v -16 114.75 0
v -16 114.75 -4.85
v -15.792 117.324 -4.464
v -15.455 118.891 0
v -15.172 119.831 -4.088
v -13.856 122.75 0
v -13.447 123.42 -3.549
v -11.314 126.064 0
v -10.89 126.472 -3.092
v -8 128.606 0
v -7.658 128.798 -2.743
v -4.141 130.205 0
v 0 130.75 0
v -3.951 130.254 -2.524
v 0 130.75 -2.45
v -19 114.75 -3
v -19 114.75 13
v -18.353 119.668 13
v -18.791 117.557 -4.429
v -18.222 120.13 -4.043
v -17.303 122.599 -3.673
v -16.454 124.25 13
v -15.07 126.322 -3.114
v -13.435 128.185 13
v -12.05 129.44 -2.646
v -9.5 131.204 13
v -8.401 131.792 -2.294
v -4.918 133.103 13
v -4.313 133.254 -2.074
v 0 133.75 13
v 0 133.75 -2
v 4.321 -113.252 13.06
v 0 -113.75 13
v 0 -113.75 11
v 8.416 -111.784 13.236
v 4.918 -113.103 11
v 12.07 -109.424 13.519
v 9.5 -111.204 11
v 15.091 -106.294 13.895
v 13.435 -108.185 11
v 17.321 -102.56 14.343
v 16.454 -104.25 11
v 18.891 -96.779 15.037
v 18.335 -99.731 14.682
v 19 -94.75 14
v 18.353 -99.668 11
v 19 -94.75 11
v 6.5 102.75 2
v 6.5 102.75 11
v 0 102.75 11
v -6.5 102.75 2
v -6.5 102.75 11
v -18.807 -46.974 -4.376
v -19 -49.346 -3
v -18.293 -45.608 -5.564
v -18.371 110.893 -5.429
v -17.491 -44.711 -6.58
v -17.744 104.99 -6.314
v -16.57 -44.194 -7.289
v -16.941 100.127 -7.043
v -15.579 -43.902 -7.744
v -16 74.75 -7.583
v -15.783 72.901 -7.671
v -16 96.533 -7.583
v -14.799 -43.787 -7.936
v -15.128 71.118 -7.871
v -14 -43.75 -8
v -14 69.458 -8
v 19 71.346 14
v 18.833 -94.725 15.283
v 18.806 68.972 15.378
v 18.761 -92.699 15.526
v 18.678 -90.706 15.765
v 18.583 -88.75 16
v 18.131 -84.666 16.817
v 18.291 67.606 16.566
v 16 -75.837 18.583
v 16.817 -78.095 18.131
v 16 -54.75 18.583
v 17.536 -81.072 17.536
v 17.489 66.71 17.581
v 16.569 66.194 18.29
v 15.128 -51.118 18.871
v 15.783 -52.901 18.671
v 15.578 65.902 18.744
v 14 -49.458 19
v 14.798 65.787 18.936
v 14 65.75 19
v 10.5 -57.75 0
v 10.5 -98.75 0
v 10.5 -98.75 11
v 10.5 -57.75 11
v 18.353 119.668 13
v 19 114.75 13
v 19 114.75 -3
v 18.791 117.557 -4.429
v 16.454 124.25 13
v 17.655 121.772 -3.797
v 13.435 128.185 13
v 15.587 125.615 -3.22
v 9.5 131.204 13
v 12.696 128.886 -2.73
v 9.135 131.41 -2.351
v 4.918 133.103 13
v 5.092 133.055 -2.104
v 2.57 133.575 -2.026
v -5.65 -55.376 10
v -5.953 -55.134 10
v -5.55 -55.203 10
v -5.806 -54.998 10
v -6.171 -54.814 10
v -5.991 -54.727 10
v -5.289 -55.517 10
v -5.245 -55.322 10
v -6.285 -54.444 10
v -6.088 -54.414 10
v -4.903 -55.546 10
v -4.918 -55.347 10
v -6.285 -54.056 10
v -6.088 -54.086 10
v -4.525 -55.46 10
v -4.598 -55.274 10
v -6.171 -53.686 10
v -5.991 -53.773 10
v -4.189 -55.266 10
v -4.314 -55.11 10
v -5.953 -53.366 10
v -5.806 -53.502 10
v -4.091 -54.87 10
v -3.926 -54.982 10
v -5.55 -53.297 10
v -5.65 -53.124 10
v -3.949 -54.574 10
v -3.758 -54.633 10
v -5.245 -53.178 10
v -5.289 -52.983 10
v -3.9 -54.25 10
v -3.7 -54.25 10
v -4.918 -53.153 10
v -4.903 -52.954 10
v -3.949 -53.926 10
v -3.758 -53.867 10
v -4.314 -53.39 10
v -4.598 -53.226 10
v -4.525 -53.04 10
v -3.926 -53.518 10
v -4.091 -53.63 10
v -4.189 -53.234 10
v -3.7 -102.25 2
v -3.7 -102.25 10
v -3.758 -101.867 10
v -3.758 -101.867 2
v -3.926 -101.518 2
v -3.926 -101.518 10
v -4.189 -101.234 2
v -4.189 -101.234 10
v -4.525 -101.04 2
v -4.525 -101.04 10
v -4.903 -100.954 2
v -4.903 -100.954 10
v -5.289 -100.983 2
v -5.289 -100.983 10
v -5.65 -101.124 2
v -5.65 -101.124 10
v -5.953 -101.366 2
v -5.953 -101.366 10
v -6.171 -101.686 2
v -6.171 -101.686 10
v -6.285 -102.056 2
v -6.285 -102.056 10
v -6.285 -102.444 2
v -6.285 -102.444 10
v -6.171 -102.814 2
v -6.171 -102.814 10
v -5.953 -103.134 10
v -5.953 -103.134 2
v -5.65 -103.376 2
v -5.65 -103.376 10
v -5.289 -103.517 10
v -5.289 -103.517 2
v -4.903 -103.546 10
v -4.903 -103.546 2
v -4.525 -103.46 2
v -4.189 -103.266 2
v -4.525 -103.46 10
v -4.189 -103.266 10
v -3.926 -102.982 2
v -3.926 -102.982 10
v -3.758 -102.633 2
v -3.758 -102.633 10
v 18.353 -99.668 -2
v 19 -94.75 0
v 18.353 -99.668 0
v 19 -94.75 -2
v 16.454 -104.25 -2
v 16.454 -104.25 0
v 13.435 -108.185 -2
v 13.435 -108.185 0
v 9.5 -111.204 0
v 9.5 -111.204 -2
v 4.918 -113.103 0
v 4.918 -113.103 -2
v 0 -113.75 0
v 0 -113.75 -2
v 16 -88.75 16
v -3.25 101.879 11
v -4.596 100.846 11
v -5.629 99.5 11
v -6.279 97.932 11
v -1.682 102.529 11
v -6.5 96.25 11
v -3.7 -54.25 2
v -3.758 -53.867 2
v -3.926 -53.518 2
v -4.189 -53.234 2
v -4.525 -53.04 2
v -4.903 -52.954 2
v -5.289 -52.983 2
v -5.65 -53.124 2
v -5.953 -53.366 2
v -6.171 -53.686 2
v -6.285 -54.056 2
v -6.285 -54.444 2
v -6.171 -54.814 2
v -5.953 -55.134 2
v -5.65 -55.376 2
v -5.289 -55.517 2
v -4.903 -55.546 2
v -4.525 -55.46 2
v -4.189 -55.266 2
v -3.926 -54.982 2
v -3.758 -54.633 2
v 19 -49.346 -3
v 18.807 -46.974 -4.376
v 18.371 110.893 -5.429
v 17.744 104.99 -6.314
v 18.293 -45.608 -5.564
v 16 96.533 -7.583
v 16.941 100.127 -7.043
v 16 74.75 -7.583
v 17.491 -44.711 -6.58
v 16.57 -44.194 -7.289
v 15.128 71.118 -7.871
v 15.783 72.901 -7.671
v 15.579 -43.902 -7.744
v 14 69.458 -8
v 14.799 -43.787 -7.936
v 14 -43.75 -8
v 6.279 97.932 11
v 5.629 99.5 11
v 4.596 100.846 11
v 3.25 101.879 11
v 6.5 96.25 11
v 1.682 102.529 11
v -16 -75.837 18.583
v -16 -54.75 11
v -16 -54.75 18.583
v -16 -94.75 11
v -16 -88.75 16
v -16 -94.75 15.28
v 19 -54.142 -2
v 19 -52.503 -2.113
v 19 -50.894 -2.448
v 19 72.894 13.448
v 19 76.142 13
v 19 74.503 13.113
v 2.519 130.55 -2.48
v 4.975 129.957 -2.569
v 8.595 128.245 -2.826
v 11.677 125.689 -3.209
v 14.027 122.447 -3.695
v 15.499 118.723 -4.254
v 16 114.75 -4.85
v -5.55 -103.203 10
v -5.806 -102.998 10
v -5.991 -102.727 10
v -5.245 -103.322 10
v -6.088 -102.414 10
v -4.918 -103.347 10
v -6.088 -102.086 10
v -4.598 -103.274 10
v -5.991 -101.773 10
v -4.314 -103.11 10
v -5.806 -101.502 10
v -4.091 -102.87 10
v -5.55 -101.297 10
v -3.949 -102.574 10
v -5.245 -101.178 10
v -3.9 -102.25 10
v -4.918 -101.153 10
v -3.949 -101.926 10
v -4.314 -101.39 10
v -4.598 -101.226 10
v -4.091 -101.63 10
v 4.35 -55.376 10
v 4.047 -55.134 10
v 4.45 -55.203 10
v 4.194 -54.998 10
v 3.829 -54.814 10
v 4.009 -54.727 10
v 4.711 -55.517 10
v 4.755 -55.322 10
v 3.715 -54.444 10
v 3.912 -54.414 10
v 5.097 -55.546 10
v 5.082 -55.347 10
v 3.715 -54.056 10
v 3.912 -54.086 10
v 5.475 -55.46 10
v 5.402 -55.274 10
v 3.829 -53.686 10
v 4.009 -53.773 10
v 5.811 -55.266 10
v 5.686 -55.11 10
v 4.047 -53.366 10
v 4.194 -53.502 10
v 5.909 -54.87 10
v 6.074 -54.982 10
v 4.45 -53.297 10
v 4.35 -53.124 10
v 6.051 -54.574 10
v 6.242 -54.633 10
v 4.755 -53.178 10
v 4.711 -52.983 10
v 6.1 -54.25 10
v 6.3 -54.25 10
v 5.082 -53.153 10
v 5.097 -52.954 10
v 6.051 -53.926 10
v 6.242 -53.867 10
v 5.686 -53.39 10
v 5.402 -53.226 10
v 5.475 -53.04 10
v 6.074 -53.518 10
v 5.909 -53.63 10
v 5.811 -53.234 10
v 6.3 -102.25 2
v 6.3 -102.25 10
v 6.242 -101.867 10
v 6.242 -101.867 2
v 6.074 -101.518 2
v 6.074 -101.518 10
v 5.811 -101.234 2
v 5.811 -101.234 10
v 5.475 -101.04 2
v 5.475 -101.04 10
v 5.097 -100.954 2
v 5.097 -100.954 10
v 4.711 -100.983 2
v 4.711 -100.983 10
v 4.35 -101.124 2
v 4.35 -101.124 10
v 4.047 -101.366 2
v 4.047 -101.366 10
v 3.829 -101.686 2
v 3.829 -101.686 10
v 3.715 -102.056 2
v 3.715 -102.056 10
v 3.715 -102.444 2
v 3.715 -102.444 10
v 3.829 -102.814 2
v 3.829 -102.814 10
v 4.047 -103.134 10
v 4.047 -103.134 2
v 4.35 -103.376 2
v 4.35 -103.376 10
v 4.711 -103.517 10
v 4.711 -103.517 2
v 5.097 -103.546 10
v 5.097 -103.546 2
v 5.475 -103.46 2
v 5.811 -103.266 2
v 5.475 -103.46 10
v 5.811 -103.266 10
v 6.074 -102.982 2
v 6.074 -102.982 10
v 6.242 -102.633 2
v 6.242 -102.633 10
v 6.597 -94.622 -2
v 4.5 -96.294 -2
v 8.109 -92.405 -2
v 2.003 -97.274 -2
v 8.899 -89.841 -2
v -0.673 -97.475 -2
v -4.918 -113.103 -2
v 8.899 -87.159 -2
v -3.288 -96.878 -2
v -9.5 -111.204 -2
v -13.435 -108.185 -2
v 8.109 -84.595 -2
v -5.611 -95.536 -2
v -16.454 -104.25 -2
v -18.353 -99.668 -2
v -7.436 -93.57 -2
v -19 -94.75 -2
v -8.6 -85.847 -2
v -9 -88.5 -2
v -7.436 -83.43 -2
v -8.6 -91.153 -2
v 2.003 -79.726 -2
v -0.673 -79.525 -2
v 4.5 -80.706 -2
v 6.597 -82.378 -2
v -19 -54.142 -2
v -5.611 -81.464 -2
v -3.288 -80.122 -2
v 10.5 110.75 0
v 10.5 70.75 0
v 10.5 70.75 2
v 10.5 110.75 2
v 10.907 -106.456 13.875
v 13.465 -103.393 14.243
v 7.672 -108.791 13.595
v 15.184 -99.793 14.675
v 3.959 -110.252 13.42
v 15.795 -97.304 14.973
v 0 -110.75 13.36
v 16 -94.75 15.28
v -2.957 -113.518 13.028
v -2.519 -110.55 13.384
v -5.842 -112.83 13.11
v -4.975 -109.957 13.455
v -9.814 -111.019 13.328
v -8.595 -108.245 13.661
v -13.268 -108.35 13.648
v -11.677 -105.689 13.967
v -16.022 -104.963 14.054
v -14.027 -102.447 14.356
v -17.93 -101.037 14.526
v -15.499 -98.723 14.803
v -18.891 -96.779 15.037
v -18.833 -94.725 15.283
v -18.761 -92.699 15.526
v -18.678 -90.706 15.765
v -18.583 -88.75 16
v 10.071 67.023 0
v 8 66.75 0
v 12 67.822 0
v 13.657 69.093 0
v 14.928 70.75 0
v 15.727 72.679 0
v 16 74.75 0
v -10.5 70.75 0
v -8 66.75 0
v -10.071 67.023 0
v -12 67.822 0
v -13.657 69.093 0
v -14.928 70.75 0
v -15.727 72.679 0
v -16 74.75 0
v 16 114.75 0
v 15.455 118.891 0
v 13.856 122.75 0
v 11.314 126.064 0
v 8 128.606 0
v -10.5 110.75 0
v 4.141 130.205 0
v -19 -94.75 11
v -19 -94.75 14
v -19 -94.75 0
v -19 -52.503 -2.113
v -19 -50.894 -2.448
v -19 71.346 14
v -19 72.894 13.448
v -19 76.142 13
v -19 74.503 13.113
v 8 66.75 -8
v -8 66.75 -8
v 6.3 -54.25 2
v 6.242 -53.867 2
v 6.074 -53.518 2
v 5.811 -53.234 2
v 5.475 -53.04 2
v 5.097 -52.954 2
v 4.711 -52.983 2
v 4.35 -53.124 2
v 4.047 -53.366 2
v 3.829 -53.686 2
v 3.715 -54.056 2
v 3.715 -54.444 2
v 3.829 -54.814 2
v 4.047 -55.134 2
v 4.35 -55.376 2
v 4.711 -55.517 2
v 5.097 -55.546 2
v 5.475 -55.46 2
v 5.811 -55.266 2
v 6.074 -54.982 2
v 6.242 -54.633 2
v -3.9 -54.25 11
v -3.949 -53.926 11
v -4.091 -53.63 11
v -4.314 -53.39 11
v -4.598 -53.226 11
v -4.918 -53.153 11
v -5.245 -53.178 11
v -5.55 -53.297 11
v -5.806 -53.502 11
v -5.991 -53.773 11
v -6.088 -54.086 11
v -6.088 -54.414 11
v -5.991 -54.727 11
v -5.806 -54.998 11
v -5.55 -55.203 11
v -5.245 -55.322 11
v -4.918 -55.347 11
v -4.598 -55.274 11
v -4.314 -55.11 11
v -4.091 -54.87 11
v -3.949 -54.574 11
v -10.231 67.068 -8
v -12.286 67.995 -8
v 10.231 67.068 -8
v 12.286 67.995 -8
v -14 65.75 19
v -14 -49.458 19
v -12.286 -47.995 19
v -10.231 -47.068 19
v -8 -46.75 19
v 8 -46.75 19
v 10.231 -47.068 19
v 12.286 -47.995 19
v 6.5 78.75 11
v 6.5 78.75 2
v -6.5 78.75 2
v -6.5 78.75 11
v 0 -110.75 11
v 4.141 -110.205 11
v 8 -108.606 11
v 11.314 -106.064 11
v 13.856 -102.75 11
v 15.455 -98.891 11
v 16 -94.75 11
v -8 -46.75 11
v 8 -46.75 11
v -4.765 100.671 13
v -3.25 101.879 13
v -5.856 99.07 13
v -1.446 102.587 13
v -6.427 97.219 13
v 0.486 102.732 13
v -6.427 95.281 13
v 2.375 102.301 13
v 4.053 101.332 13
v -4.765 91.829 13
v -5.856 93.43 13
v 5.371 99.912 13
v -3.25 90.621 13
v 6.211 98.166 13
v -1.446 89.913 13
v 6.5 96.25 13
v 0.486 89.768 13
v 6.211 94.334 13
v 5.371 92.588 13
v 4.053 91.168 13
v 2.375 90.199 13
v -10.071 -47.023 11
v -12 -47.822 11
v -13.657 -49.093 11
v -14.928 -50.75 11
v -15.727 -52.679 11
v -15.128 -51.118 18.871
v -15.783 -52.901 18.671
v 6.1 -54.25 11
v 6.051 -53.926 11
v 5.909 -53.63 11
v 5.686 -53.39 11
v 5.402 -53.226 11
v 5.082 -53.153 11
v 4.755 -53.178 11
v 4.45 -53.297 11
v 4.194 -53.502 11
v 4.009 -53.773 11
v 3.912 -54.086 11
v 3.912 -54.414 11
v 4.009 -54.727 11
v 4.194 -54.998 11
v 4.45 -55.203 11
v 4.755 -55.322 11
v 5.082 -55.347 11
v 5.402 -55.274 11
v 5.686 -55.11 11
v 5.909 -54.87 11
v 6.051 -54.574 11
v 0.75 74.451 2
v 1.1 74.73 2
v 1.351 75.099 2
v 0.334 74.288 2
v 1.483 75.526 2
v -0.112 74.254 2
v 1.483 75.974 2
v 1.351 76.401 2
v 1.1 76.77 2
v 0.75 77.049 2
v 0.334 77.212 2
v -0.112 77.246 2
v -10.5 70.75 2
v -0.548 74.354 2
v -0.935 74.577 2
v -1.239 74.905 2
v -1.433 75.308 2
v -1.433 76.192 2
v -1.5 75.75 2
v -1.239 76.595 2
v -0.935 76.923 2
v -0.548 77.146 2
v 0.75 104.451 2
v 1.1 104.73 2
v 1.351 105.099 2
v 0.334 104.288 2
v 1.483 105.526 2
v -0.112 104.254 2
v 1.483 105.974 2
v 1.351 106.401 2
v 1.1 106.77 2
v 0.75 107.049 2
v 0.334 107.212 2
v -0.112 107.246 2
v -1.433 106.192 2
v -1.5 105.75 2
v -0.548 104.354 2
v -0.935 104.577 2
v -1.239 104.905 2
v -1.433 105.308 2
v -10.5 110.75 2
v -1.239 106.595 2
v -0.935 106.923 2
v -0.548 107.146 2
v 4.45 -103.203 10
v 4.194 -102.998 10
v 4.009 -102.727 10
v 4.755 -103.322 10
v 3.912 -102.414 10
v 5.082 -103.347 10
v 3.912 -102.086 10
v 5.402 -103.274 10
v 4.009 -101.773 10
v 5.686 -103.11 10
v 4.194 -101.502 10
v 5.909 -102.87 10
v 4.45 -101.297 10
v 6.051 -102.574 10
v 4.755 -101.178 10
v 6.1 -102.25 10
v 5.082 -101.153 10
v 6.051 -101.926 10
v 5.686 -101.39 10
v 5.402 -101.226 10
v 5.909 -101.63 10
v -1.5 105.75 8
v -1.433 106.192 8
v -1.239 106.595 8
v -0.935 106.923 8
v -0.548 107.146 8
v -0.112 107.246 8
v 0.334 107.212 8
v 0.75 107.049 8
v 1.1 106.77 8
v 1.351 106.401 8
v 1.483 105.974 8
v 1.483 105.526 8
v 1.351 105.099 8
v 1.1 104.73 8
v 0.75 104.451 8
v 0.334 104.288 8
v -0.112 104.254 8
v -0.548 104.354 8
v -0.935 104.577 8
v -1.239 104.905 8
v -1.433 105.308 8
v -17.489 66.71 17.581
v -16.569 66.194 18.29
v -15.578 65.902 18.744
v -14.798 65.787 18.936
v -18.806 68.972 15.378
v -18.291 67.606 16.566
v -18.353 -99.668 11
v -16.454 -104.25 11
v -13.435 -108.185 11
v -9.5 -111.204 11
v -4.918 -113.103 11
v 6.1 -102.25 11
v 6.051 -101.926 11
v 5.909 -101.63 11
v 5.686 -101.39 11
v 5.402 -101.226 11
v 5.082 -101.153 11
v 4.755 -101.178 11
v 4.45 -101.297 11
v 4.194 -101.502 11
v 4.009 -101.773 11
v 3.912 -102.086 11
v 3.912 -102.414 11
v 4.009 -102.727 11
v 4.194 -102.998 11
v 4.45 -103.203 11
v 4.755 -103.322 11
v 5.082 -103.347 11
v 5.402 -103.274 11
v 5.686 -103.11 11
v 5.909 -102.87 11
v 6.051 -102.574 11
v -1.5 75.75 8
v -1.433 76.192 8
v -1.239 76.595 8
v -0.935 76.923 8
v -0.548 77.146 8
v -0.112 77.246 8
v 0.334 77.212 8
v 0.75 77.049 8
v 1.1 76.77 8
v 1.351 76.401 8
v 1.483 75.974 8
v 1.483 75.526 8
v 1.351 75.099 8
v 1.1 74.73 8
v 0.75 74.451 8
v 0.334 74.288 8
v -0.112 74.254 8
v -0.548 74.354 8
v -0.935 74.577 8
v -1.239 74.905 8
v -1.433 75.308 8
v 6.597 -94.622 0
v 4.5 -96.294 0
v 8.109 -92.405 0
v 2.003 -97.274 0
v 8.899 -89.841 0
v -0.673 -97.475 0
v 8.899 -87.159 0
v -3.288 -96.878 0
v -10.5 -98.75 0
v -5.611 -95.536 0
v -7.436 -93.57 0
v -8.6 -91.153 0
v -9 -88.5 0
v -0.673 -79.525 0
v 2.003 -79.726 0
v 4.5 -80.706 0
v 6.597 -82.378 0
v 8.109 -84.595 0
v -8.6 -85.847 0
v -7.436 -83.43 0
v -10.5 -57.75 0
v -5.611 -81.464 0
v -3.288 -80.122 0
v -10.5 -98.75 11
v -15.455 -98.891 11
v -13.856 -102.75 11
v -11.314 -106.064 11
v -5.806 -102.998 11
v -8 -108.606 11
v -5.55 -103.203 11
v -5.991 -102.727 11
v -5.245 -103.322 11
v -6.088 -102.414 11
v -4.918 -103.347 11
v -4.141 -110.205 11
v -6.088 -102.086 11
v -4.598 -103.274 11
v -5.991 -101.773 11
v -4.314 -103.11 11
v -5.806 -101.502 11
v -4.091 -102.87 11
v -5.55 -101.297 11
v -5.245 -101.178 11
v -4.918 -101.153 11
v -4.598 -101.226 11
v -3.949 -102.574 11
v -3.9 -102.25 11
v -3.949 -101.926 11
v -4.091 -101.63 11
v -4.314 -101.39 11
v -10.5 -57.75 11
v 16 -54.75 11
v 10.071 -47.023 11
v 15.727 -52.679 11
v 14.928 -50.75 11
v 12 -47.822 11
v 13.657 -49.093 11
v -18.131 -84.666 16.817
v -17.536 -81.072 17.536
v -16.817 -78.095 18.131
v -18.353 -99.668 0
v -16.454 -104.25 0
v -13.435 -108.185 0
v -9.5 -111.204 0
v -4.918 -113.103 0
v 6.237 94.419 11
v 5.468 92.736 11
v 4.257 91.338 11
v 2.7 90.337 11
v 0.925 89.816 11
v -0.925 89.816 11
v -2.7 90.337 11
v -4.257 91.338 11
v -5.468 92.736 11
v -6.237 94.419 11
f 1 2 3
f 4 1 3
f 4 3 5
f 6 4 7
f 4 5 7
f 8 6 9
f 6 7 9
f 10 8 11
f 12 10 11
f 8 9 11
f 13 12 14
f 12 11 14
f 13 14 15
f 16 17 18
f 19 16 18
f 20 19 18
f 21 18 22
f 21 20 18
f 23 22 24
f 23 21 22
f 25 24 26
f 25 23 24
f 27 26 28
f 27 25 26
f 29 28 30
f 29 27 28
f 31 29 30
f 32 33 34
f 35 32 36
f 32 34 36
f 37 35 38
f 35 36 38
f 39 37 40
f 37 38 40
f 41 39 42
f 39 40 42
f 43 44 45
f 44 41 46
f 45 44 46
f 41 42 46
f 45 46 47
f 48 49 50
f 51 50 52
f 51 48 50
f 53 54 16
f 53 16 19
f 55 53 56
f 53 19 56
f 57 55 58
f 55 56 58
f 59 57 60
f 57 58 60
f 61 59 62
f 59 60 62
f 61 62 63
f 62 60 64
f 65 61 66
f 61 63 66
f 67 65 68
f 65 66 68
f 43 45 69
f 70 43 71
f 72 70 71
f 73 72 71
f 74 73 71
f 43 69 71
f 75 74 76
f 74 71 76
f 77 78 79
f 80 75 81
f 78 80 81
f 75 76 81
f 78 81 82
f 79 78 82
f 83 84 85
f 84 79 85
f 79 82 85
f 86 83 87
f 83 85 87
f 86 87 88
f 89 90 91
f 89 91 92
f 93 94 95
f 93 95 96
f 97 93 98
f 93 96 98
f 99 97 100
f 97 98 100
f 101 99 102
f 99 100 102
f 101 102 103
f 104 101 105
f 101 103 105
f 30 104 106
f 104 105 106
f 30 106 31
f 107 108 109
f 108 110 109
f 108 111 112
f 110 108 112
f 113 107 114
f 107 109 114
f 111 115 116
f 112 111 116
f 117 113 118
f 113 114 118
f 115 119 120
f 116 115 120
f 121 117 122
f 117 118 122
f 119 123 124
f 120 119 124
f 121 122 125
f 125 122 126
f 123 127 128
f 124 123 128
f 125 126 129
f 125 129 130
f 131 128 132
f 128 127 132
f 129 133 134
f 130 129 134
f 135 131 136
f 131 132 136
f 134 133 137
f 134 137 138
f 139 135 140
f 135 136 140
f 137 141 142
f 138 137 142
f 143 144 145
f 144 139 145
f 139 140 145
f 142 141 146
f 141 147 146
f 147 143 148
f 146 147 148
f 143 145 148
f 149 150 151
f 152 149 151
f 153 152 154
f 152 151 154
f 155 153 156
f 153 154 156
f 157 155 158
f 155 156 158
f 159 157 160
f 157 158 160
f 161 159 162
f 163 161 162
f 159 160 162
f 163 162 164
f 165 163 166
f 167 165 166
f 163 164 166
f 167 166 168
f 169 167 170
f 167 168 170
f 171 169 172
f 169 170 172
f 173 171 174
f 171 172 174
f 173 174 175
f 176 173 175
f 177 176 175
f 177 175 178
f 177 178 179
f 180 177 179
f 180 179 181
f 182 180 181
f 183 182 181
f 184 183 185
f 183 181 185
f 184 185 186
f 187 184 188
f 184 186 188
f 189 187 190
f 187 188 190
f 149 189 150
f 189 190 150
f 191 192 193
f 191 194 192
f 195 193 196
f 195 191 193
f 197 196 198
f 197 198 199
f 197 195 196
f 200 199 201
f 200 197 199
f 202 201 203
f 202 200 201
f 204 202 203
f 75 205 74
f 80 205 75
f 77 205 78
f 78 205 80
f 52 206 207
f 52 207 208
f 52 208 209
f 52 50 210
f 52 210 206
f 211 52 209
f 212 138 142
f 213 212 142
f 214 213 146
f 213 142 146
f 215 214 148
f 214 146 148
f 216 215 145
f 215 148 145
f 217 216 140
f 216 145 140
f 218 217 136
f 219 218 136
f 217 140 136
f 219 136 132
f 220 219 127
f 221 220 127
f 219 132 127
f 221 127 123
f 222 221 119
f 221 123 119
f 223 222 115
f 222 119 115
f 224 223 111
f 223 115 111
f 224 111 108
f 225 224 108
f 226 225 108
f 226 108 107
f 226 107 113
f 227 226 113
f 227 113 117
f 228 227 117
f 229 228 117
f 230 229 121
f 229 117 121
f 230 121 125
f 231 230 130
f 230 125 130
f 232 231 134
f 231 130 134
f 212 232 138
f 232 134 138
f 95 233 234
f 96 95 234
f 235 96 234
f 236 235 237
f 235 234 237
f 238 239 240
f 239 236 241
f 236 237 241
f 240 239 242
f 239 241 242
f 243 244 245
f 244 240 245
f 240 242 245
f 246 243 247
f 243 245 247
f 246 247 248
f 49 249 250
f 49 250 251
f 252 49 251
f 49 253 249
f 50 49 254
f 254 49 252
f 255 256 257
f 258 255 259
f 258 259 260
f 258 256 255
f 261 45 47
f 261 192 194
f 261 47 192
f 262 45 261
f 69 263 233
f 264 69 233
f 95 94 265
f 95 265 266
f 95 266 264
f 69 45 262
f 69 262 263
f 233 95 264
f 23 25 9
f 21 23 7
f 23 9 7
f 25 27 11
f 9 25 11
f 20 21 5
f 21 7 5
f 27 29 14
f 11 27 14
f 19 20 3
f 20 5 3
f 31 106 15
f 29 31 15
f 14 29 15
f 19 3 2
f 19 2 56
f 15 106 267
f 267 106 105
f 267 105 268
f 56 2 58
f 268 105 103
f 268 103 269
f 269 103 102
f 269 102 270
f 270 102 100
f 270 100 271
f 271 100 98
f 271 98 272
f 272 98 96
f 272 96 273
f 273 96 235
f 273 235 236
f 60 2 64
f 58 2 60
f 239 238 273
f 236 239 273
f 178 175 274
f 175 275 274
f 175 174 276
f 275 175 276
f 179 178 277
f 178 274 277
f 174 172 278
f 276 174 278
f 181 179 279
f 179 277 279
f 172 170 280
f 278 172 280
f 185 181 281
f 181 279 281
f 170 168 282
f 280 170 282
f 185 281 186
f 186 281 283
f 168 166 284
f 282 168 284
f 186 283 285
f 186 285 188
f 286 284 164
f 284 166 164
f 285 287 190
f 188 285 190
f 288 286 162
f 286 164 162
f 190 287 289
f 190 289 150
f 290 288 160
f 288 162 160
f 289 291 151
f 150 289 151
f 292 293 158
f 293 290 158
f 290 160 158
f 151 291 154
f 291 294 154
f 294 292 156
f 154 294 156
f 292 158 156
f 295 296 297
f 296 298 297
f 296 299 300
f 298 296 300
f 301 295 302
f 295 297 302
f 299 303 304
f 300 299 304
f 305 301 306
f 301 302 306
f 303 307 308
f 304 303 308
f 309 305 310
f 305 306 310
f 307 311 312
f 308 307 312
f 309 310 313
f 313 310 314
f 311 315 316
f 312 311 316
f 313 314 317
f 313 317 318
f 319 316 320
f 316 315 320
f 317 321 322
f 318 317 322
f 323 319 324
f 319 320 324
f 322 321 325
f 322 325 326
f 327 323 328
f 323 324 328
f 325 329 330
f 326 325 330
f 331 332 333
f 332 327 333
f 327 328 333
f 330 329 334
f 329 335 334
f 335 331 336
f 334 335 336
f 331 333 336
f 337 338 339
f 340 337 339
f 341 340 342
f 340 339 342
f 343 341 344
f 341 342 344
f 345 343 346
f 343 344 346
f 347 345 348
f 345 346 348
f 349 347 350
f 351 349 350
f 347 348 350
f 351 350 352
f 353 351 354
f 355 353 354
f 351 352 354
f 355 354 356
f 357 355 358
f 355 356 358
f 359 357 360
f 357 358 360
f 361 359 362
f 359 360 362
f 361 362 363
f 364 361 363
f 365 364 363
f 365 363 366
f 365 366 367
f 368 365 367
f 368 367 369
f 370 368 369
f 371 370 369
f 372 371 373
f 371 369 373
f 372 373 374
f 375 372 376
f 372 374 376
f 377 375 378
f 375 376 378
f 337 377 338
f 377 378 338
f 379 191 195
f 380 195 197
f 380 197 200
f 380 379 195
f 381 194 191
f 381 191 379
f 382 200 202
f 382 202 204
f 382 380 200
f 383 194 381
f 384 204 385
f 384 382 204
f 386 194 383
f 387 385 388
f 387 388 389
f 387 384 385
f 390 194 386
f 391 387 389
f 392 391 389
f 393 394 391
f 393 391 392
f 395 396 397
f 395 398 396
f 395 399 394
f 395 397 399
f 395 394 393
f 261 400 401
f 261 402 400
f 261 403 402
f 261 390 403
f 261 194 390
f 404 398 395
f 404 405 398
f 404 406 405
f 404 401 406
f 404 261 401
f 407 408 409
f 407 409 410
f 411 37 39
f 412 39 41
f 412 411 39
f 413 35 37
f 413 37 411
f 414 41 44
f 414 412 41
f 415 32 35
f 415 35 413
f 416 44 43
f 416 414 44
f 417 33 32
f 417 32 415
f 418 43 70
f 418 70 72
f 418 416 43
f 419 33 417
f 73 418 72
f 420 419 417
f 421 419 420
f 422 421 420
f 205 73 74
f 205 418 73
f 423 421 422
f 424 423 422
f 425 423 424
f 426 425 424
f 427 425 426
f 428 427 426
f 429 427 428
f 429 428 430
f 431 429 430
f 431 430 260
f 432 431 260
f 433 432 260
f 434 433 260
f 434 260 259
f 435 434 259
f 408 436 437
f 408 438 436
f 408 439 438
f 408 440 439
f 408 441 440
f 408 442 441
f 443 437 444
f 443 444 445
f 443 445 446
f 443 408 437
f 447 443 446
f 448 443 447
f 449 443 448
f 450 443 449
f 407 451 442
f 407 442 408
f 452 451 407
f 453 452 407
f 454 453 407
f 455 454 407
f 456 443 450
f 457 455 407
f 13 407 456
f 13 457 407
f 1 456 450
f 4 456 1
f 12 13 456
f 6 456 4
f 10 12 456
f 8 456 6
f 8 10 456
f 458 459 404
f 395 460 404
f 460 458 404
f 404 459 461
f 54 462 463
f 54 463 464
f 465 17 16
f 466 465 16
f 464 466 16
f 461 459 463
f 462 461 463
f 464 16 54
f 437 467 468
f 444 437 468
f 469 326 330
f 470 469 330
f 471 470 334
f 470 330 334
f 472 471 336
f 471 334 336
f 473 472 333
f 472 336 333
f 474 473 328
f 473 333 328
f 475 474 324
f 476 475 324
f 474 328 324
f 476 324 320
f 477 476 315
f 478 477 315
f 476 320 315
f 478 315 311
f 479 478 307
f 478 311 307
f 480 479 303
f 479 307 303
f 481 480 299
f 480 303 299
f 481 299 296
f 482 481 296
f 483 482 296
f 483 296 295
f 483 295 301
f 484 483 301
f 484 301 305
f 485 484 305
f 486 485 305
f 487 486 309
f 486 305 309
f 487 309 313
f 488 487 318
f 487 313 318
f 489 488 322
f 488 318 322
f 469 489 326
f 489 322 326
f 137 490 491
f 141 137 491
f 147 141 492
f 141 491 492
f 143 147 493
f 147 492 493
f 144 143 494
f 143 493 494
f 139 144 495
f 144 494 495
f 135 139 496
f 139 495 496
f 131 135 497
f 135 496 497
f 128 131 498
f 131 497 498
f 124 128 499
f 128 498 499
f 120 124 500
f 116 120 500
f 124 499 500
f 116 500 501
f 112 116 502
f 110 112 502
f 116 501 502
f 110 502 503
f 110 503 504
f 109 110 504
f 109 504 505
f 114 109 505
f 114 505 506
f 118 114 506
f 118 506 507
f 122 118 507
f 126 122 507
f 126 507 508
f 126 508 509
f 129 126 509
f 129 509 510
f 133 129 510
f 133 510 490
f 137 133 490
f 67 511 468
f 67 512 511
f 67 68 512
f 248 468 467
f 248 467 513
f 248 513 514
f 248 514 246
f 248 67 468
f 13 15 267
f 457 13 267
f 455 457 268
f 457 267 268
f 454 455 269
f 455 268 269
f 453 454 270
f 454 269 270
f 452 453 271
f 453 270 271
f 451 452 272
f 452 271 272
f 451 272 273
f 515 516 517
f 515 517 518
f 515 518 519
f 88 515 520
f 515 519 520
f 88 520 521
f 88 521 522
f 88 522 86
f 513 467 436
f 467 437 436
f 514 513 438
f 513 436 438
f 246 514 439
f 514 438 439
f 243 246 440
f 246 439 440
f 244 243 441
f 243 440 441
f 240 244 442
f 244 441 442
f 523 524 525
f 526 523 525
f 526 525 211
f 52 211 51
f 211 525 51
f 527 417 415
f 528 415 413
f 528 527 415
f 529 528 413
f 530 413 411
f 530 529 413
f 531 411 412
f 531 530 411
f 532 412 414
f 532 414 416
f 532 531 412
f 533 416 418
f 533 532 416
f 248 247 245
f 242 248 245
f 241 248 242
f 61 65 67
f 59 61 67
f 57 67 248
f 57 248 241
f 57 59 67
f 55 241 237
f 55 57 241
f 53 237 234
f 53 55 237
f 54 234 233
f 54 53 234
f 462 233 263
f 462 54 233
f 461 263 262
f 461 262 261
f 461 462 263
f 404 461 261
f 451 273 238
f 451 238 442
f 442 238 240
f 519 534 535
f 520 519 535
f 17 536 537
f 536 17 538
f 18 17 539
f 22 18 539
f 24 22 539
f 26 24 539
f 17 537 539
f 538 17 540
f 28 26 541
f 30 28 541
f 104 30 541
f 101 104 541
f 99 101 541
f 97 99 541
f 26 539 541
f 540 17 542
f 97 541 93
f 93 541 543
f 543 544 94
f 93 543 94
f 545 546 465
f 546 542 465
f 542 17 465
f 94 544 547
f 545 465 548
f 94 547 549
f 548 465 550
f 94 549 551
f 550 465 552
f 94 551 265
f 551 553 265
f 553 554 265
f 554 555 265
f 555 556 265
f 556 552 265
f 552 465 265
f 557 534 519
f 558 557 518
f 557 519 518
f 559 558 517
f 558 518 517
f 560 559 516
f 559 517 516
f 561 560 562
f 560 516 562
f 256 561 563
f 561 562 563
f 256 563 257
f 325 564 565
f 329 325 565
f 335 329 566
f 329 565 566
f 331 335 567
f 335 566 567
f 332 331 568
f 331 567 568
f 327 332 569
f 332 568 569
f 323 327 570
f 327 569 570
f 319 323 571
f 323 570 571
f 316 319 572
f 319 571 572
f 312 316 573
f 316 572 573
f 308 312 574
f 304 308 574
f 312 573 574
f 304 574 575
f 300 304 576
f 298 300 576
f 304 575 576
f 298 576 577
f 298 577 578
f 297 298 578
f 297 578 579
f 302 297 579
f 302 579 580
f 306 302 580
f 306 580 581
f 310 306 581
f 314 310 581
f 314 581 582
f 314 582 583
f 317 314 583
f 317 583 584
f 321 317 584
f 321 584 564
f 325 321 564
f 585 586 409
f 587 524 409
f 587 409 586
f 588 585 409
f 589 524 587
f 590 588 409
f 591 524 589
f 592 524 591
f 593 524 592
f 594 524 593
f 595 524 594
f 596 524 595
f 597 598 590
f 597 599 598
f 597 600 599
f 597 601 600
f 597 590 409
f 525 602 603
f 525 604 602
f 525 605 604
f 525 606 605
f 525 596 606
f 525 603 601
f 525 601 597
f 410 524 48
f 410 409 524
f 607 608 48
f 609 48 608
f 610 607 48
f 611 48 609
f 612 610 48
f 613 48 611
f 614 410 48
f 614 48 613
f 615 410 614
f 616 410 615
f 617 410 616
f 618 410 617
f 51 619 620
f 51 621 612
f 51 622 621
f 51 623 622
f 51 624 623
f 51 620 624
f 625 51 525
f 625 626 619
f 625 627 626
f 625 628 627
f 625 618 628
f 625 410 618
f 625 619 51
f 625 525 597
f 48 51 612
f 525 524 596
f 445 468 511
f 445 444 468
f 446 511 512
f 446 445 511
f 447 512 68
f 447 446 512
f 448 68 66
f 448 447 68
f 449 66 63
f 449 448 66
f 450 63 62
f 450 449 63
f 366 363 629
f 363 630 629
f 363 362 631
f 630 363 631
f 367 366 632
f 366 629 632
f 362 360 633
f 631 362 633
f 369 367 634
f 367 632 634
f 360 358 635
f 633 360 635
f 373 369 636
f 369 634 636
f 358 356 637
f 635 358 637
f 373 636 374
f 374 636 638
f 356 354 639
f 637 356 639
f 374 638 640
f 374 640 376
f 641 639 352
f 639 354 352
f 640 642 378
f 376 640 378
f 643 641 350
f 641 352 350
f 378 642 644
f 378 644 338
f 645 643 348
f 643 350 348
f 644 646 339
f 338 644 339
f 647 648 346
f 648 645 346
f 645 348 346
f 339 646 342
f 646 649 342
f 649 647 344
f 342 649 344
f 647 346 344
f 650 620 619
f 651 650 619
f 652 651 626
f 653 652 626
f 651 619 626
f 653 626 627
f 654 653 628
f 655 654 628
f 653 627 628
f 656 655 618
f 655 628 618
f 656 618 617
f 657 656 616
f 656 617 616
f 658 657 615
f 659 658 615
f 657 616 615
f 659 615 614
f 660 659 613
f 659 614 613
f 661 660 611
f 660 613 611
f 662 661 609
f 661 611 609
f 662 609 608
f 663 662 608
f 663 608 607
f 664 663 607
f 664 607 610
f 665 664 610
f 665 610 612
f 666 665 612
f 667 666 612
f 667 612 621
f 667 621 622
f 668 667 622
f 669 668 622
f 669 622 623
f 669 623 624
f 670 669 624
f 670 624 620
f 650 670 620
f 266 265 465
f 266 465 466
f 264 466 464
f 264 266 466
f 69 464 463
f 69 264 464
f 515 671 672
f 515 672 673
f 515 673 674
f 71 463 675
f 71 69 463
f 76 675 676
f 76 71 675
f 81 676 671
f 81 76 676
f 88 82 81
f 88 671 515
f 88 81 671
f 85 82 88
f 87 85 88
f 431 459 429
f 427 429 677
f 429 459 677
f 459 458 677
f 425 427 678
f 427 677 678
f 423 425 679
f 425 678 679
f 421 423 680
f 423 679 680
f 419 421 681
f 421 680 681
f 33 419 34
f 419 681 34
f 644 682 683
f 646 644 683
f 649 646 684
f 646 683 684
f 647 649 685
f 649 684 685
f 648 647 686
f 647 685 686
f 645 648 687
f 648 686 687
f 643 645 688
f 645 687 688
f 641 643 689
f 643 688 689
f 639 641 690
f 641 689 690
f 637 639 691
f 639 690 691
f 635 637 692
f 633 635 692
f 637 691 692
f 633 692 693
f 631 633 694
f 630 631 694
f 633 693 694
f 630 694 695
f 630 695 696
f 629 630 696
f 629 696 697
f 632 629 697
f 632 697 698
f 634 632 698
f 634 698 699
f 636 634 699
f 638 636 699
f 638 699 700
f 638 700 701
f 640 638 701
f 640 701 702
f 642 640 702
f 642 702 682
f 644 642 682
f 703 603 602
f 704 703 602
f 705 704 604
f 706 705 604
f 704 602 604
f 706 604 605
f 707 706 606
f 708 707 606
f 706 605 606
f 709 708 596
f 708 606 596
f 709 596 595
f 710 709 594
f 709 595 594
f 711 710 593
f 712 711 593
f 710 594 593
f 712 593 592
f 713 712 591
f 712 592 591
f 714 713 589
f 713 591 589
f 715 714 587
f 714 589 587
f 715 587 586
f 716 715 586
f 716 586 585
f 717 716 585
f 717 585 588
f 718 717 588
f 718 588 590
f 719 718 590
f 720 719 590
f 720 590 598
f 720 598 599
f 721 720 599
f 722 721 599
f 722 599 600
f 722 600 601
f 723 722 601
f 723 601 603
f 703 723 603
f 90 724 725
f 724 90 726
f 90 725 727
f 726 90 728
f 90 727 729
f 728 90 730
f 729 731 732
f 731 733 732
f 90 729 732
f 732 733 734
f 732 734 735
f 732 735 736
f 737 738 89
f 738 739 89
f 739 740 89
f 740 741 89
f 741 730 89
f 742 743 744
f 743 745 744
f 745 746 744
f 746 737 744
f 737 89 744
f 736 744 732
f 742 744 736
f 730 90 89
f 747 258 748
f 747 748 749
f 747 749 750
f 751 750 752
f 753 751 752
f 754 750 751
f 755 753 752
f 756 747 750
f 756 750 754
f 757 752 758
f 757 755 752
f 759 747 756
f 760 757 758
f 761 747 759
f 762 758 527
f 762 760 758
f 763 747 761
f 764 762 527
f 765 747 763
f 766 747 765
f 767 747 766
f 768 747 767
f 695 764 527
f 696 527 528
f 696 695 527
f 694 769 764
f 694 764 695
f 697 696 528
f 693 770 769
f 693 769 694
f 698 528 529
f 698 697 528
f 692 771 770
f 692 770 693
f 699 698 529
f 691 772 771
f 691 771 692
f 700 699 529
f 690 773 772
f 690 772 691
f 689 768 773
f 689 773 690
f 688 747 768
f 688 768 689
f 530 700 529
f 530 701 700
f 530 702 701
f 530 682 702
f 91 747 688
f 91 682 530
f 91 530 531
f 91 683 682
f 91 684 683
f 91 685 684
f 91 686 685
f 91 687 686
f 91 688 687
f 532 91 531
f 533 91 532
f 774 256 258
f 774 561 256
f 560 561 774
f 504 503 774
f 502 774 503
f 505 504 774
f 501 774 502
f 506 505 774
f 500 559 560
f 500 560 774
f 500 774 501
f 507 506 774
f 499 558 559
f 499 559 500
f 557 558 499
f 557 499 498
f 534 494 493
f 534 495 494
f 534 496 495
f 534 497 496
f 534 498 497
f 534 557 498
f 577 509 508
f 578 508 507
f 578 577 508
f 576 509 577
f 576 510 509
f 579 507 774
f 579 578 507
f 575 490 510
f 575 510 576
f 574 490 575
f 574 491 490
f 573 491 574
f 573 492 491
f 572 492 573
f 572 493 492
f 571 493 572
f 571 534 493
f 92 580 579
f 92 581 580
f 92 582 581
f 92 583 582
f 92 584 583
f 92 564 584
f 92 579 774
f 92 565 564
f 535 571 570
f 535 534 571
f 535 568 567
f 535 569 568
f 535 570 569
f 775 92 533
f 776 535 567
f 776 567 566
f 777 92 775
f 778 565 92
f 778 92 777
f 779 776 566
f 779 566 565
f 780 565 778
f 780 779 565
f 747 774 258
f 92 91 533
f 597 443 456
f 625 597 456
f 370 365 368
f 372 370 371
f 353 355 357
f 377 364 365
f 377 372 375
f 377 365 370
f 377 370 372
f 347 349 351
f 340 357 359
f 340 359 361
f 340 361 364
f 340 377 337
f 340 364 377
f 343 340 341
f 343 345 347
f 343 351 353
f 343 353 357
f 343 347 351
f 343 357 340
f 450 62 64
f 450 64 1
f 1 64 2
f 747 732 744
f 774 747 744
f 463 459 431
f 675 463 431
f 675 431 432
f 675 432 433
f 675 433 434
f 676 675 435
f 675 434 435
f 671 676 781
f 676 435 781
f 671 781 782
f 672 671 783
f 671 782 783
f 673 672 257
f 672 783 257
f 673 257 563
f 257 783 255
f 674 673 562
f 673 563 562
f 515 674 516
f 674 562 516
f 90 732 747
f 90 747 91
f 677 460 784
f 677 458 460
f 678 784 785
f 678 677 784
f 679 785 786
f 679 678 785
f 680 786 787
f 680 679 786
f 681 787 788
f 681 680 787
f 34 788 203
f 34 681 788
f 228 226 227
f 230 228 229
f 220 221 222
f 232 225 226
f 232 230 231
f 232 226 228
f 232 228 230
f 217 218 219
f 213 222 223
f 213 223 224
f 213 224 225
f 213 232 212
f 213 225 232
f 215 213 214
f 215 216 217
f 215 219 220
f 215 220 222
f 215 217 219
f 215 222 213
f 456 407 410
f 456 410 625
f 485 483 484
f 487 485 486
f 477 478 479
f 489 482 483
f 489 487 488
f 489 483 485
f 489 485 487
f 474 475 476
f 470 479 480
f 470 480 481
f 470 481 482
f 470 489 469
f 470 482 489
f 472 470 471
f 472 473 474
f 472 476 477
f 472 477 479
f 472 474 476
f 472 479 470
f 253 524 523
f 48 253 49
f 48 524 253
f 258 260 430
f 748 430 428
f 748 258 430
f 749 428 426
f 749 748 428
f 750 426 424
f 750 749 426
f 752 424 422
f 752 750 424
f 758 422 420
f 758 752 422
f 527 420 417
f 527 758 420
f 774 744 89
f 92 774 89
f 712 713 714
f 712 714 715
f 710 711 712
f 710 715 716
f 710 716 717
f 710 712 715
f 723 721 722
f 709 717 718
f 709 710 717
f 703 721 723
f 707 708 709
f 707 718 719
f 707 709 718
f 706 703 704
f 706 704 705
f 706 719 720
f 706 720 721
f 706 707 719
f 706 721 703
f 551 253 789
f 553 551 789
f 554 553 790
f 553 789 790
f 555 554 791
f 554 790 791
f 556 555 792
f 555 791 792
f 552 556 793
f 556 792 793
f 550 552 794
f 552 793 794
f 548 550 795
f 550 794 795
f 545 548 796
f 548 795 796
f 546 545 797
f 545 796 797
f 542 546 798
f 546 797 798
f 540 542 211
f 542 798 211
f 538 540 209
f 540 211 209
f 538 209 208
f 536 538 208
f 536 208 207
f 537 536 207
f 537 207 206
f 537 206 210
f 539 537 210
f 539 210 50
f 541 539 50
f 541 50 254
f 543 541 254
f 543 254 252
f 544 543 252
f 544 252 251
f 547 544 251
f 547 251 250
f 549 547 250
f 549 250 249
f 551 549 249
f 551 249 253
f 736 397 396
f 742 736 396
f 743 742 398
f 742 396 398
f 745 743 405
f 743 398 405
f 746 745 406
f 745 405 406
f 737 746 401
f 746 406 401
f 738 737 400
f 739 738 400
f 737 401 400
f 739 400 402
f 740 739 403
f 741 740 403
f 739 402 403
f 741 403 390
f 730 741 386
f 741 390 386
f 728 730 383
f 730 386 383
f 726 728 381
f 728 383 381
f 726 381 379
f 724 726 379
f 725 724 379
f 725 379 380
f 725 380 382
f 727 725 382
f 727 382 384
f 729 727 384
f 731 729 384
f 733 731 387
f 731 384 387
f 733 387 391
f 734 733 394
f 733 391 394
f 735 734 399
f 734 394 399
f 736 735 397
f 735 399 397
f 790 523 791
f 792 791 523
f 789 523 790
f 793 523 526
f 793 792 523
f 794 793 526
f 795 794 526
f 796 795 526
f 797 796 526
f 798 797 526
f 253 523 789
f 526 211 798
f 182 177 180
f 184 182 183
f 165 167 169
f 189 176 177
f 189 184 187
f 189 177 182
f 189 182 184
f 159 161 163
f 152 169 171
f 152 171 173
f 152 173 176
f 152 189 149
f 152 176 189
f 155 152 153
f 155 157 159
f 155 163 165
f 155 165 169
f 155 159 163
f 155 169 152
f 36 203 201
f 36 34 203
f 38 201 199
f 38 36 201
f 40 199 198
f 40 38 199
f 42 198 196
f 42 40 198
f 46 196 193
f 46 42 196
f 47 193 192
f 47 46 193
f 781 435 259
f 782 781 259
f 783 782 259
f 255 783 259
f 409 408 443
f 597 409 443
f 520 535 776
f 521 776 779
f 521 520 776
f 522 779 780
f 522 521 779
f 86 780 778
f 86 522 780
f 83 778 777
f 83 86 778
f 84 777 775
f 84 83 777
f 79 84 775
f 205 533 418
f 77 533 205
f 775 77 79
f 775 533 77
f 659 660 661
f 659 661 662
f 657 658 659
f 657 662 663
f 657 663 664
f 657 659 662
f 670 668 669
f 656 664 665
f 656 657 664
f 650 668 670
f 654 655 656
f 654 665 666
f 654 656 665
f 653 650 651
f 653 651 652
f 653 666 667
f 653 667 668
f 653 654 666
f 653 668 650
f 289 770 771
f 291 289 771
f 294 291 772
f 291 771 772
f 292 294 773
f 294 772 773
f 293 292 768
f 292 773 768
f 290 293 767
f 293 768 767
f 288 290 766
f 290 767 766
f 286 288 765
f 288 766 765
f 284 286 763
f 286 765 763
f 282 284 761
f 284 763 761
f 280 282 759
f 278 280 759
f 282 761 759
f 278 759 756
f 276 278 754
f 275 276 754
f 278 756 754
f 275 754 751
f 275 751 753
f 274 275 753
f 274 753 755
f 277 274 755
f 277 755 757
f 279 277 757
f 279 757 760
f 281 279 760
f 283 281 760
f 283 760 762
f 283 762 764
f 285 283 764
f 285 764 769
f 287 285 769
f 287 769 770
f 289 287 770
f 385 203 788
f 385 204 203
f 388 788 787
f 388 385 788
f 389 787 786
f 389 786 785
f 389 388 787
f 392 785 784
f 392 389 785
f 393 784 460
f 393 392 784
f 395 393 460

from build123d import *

# Parameters (mm, degrees)
SKETCH1_W               = 38
SKETCH1_H               = 227.5
SKETCH1_W_2             = 21
SKETCH1_H_2             = 41
BOSS_EXTRUDE1_DEPTH     = 11
SKETCH3_R               = 1.3
CUT_EXTRUDE1_DEPTH      = 8
FILLET3_R               = 19
BOSS_EXTRUDE2_DEPTH     = 8
CUT_EXTRUDE2_DEPTH      = 117.880547997
CUT_EXTRUDE2_DEPTH_BACK = 117.880547997
SKETCH7_W               = 32
SKETCH7_H               = 157.5
BOSS_EXTRUDE4_DEPTH     = 8
SKETCH8_W               = 38
SKETCH8_H               = 157.5
BOSS_EXTRUDE5_DEPTH     = 8
BOSS_EXTRUDE10_START    = 2
SKETCH27_R              = 9
BOSS_EXTRUDE10_DEPTH    = 2
SKETCH28_W              = 38
SKETCH28_H              = 27
BOSS_EXTRUDE11_DEPTH    = 20
FILLET4_R               = 19
CUT_EXTRUDE14_DEPTH     = 8
SKETCH30_W              = 13
SKETCH30_H              = 24
CUT_EXTRUDE15_DEPTH     = 11
CUT_EXTRUDE16_REACH     = 138.422
SKETCH31_R              = 6.5
CUT_EXTRUDE17_START     = 65.75
CUT_EXTRUDE17_OUTLINE_W = 38
CUT_EXTRUDE17_OUTLINE_H = 6
CUT_EXTRUDE17_DEPTH     = 68
FILLET5_R               = 12
CUT_EXTRUDE18_DEPTH     = 141.335535414
FILLET7_R               = 5
SKETCH34_R              = 1.5
CUT_EXTRUDE19_DEPTH     = 8
SKETCH35_R              = 1.1
CUT_EXTRUDE20_DEPTH     = 8
FILLET8_R               = 8
SKETCH36_W              = 21
SKETCH36_H              = 40
CUT_EXTRUDE21_DEPTH     = 2


# Read off the part's stored shape, not the designer's step: Cut-Extrude17
# Some blends are built 0.0001 mm under size
with BuildPart() as part:
    # Sketch1 → Boss-Extrude1 (new body)
    with BuildSketch(Plane.XY):
        Rectangle(SKETCH1_W, SKETCH1_H)
        with Locations((0, -78.25)):
            Rectangle(SKETCH1_W_2, SKETCH1_H_2, mode=Mode.SUBTRACT)
    extrude(amount=BOSS_EXTRUDE1_DEPTH)

    # Sketch3 → Cut-Extrude1 (cut)
    with BuildSketch(Plane.XY.offset(10)):
        with Locations((-5, -54.25)):
            Circle(SKETCH3_R)
        with Locations((5, -54.25)):
            Circle(SKETCH3_R)
        with Locations((5, -102.25)):
            Circle(SKETCH3_R)
        with Locations((-5, -102.25)):
            Circle(SKETCH3_R)
    extrude(amount=-CUT_EXTRUDE1_DEPTH, mode=Mode.SUBTRACT)

    # Fillet3
    fillet3_edges = [part.edges().sort_by_distance(p)[0] for p in [
        (19, -113.75, 5.5),
        (-19, -113.75, 5.5),
    ]]
    fillet(fillet3_edges, radius=FILLET3_R - 0.0001)  # a hair under: the kernel refuses the full size

    # Sketch4 → Boss-Extrude2 (add)
    with BuildSketch(Plane.XY.offset(11)):
        with BuildLine():
            Line((19, -94.75), (19, 113.75))
            Line((19, 113.75), (-19, 113.75))
            Line((-19, 113.75), (-19, -94.75))
            ThreePointArc((-19, -94.75), (-13.435028843, -108.185028843), (0, -113.75))
            ThreePointArc((0, -113.75), (13.435028843, -108.185028843), (19, -94.75))
        make_face()
        with BuildLine():
            Line((16, -94.75), (16, 110.75))
            Line((16, 110.75), (-16, 110.75))
            Line((-16, 110.75), (-16, -94.75))
            ThreePointArc((-16, -94.75), (-11.313708499, -106.063708499), (0, -110.75))
            ThreePointArc((0, -110.75), (11.313708499, -106.063708499), (16, -94.75))
        make_face(mode=Mode.SUBTRACT)
    extrude(amount=BOSS_EXTRUDE2_DEPTH)

    # Sketch6 → Cut-Extrude2 (cut, two sides: drawn at the far end of the back side and taken through both)
    with BuildSketch(Plane(origin=(0, 0, 0), x_dir=(0, 0, -1), z_dir=(1, 0, 0)).offset(-CUT_EXTRUDE2_DEPTH_BACK)):
        Polygon((-13, -113.75), (-16, -88.75), (-19, -73.75), (-19, -113.75), align=None)
    extrude(amount=CUT_EXTRUDE2_DEPTH + CUT_EXTRUDE2_DEPTH_BACK, mode=Mode.SUBTRACT)

    # Sketch7 → Boss-Extrude4 (add)
    with BuildSketch(Plane.XY.offset(11)):
        with Locations((0, 32)):
            Rectangle(SKETCH7_W, SKETCH7_H)
    extrude(amount=BOSS_EXTRUDE4_DEPTH)

    # Sketch8 → Boss-Extrude5 (add)
    with BuildSketch(Plane(origin=(0, 0, 0), x_dir=(-1, 0, 0), z_dir=(0, 0, -1))):
        with Locations((0, 35)):
            Rectangle(SKETCH8_W, SKETCH8_H)
    extrude(amount=BOSS_EXTRUDE5_DEPTH)

    # Sketch27 → Boss-Extrude10 (add)
    with BuildSketch(Plane(origin=(0, 0, 0), x_dir=(-1, 0, 0), z_dir=(0, 0, -1)).offset(BOSS_EXTRUDE10_START)):
        with BuildLine():
            Line((19, -94.75), (19, -43.75))
            Line((19, -43.75), (-19, -43.75))
            Line((-19, -43.75), (-19, -94.75))
            ThreePointArc((-19, -94.75), (-13.435028843, -108.185028843), (0, -113.75))
            ThreePointArc((0, -113.75), (13.435028843, -108.185028843), (19, -94.75))
        make_face()
        with Locations((0, -88.5)):
            Circle(SKETCH27_R, mode=Mode.SUBTRACT)
    extrude(amount=-BOSS_EXTRUDE10_DEPTH)

    # Sketch28 → Boss-Extrude11 (add)
    with BuildSketch(Plane(origin=(0, 113.75, 0), x_dir=(1, 0, 0), z_dir=(0, 1, 0))):
        with Locations((0, -5.5)):
            Rectangle(SKETCH28_W, SKETCH28_H)
    extrude(amount=BOSS_EXTRUDE11_DEPTH)

    # Fillet4
    fillet4_edges = [part.edges().sort_by_distance(p)[0] for p in [
        (-19, 133.75, 5.5),
        (19, 133.75, 5.5),
    ]]
    fillet(fillet4_edges, radius=FILLET4_R - 0.0001)  # a hair under: the kernel refuses the full size

    # Sketch29 → Cut-Extrude14 (cut)
    with BuildSketch(Plane(origin=(0, 0, -8), x_dir=(-1, 0, 0), z_dir=(0, 0, -1))):
        with BuildLine():
            Line((16, 66.75), (16, 114.75))
            ThreePointArc((16, 114.75), (11.313708499, 126.063708499), (0, 130.75))
            ThreePointArc((0, 130.75), (-11.313708499, 126.063708499), (-16, 114.75))
            Line((-16, 114.75), (-16, 66.75))
            Line((-16, 66.75), (16, 66.75))
        make_face()
    extrude(amount=-CUT_EXTRUDE14_DEPTH, mode=Mode.SUBTRACT)

    # Sketch30 → Cut-Extrude15 (cut)
    with BuildSketch(Plane(origin=(0, 0, 0), x_dir=(-1, 0, 0), z_dir=(0, 0, -1))):
        with Locations((0, 90.75)):
            Rectangle(SKETCH30_W, SKETCH30_H)
    extrude(amount=-CUT_EXTRUDE15_DEPTH, mode=Mode.SUBTRACT)

    # Sketch31 → Cut-Extrude16 (cut, up to next)
    with BuildSketch(Plane(origin=(0, 0, 11), x_dir=(-1, 0, 0), z_dir=(0, 0, -1)), mode=Mode.PRIVATE) as cut_extrude16_sk1:
        with Locations(Location((0, 96.25, 0), (0, 0, 180))):
            Circle(SKETCH31_R)
    cut_extrude16_tool1 = extrude(cut_extrude16_sk1.sketch, amount=-CUT_EXTRUDE16_REACH, mode=Mode.PRIVATE) & part.part
    add(cut_extrude16_tool1.solids().sort_by_distance((0, 96.25, 11))[0], mode=Mode.SUBTRACT)

    # Cut-Extrude17 outline → Cut-Extrude17 (cut)
    with BuildSketch(Plane(origin=(0, 0, 0), x_dir=(1, 0, 0), z_dir=(0, 1, 0)).offset(CUT_EXTRUDE17_START)):
        with Locations((0, -16)):
            Rectangle(CUT_EXTRUDE17_OUTLINE_W, CUT_EXTRUDE17_OUTLINE_H)
    extrude(amount=CUT_EXTRUDE17_DEPTH, mode=Mode.SUBTRACT)

    # Fillet5
    # the kernel refuses this fillet: 12 mm, written as the material it adds along each edge
    with BuildSketch(Plane(origin=(-19, -43.75, -2), x_dir=(0, 0, -1), z_dir=(1, 0, 0))) as fillet5_piece_1:
        with BuildLine():
            CenterArc((12, -10.392304845), FILLET5_R, 120, 60)
            Line((0, -10.392304845), (-0.24, -10.392304845))
            Line((-0.24, -10.392304845), (-0.24, 0))
            Line((-0.24, 0), (0, 0.24))
            ThreePointArc((0, 0.24), (3, 0.24), (5.88, 0.207846097))
            Line((5.88, 0.207846097), (6, 0))
        make_face()
    extrude(amount=38)
    with BuildSketch(Plane(origin=(19, 65.75, 13), x_dir=(0, 0, 1), z_dir=(-1, 0, 0))) as fillet5_piece_2:
        with BuildLine():
            CenterArc((12, 10.392304845), FILLET5_R, 180, 60)
            Line((0, 10.392304845), (-0.24, 10.392304845))
            Line((-0.24, 10.392304845), (-0.24, 0))
            Line((-0.24, 0), (0, -0.24))
            ThreePointArc((0, -0.24), (3, -0.24), (5.88, -0.207846097))
            Line((5.88, -0.207846097), (6, 0))
        make_face()
    extrude(amount=38)

    # Sketch33 → Cut-Extrude18 (cut, through all)
    with BuildSketch(Plane(origin=(19, 0, 0), x_dir=(0, 0, -1), z_dir=(1, 0, 0))):
        Polygon((2, 133.75), (8, 93.75), (8, 133.75), align=None)
    extrude(amount=-CUT_EXTRUDE18_DEPTH, mode=Mode.SUBTRACT)

    # Fillet7
    # the kernel refuses this fillet: 5 mm, written as the material it takes off along each edge
    with BuildSketch(Plane(origin=(-19, 123.75, -8), x_dir=(0, 0, 1), z_dir=(0, -1, 0)), Plane(origin=(19, -73.75, -8), x_dir=(0, 0, 1), z_dir=(0, 1, 0))) as fillet7_piece_1:
        with BuildLine():
            CenterArc((FILLET7_R, -FILLET7_R), FILLET7_R, 90, 90)
            Line((0, -FILLET7_R), (-FILLET7_R * 0.02, -FILLET7_R))
            Line((-FILLET7_R * 0.02, -FILLET7_R), (-FILLET7_R * 0.02, FILLET7_R * 0.02))
            Line((-FILLET7_R * 0.02, FILLET7_R * 0.02), (FILLET7_R, FILLET7_R * 0.02))
            Line((FILLET7_R, FILLET7_R * 0.02), (FILLET7_R, 0))
        make_face()
    extrude(amount=197.5, mode=Mode.SUBTRACT)
    with BuildSketch(Plane(origin=(-19, -103.75, 19), x_dir=(1, 0, 0), z_dir=(0, 1, 0)), Plane(origin=(19, 95.75, 19), x_dir=(-1, 0, 0), z_dir=(0, -1, 0))) as fillet7_piece_2:
        with BuildLine():
            CenterArc((FILLET7_R, FILLET7_R), FILLET7_R, 180, 90)
            Line((0, FILLET7_R), (-FILLET7_R * 0.02, FILLET7_R))
            Line((-FILLET7_R * 0.02, FILLET7_R), (-FILLET7_R * 0.02, -FILLET7_R * 0.02))
            Line((-FILLET7_R * 0.02, -FILLET7_R * 0.02), (FILLET7_R, -FILLET7_R * 0.02))
            Line((FILLET7_R, -FILLET7_R * 0.02), (FILLET7_R, 0))
        make_face()
    extrude(amount=199.5, mode=Mode.SUBTRACT)

    # Sketch34 → Cut-Extrude19 (cut)
    with BuildSketch(Plane(origin=(0, 0, 0), x_dir=(-1, 0, 0), z_dir=(0, 0, -1))):
        with Locations((0, 105.75)):
            Circle(SKETCH34_R)
        with Locations((0, 75.75)):
            Circle(SKETCH34_R)
    extrude(amount=-CUT_EXTRUDE19_DEPTH, mode=Mode.SUBTRACT)

    # Sketch35 → Cut-Extrude20 (cut)
    with BuildSketch(Plane.XY.offset(11)):
        with Locations((-5, -54.25)):
            Circle(SKETCH35_R)
        with Locations((5, -54.25)):
            Circle(SKETCH35_R)
        with Locations((5, -102.25)):
            Circle(SKETCH35_R)
        with Locations((-5, -102.25)):
            Circle(SKETCH35_R)
    extrude(amount=-CUT_EXTRUDE20_DEPTH, mode=Mode.SUBTRACT)

    # Fillet8
    fillet8_edges = [part.edges().sort_by_distance(p)[0] for p in [
        (-16, -46.75, 14.791287847),
        (16, -46.75, 14.791287847),
        (16, 66.75, -3.791287847),
        (-16, 66.75, -3.791287847),
    ]]
    fillet(fillet8_edges, radius=FILLET8_R)

    # Sketch36 → Cut-Extrude21 (cut)
    with BuildSketch(Plane(origin=(0, 0, 0), x_dir=(-1, 0, 0), z_dir=(0, 0, -1))):
        with Locations((0, 90.75)):
            Rectangle(SKETCH36_W, SKETCH36_H)
    extrude(amount=-CUT_EXTRUDE21_DEPTH, mode=Mode.SUBTRACT)


solid = part.part
